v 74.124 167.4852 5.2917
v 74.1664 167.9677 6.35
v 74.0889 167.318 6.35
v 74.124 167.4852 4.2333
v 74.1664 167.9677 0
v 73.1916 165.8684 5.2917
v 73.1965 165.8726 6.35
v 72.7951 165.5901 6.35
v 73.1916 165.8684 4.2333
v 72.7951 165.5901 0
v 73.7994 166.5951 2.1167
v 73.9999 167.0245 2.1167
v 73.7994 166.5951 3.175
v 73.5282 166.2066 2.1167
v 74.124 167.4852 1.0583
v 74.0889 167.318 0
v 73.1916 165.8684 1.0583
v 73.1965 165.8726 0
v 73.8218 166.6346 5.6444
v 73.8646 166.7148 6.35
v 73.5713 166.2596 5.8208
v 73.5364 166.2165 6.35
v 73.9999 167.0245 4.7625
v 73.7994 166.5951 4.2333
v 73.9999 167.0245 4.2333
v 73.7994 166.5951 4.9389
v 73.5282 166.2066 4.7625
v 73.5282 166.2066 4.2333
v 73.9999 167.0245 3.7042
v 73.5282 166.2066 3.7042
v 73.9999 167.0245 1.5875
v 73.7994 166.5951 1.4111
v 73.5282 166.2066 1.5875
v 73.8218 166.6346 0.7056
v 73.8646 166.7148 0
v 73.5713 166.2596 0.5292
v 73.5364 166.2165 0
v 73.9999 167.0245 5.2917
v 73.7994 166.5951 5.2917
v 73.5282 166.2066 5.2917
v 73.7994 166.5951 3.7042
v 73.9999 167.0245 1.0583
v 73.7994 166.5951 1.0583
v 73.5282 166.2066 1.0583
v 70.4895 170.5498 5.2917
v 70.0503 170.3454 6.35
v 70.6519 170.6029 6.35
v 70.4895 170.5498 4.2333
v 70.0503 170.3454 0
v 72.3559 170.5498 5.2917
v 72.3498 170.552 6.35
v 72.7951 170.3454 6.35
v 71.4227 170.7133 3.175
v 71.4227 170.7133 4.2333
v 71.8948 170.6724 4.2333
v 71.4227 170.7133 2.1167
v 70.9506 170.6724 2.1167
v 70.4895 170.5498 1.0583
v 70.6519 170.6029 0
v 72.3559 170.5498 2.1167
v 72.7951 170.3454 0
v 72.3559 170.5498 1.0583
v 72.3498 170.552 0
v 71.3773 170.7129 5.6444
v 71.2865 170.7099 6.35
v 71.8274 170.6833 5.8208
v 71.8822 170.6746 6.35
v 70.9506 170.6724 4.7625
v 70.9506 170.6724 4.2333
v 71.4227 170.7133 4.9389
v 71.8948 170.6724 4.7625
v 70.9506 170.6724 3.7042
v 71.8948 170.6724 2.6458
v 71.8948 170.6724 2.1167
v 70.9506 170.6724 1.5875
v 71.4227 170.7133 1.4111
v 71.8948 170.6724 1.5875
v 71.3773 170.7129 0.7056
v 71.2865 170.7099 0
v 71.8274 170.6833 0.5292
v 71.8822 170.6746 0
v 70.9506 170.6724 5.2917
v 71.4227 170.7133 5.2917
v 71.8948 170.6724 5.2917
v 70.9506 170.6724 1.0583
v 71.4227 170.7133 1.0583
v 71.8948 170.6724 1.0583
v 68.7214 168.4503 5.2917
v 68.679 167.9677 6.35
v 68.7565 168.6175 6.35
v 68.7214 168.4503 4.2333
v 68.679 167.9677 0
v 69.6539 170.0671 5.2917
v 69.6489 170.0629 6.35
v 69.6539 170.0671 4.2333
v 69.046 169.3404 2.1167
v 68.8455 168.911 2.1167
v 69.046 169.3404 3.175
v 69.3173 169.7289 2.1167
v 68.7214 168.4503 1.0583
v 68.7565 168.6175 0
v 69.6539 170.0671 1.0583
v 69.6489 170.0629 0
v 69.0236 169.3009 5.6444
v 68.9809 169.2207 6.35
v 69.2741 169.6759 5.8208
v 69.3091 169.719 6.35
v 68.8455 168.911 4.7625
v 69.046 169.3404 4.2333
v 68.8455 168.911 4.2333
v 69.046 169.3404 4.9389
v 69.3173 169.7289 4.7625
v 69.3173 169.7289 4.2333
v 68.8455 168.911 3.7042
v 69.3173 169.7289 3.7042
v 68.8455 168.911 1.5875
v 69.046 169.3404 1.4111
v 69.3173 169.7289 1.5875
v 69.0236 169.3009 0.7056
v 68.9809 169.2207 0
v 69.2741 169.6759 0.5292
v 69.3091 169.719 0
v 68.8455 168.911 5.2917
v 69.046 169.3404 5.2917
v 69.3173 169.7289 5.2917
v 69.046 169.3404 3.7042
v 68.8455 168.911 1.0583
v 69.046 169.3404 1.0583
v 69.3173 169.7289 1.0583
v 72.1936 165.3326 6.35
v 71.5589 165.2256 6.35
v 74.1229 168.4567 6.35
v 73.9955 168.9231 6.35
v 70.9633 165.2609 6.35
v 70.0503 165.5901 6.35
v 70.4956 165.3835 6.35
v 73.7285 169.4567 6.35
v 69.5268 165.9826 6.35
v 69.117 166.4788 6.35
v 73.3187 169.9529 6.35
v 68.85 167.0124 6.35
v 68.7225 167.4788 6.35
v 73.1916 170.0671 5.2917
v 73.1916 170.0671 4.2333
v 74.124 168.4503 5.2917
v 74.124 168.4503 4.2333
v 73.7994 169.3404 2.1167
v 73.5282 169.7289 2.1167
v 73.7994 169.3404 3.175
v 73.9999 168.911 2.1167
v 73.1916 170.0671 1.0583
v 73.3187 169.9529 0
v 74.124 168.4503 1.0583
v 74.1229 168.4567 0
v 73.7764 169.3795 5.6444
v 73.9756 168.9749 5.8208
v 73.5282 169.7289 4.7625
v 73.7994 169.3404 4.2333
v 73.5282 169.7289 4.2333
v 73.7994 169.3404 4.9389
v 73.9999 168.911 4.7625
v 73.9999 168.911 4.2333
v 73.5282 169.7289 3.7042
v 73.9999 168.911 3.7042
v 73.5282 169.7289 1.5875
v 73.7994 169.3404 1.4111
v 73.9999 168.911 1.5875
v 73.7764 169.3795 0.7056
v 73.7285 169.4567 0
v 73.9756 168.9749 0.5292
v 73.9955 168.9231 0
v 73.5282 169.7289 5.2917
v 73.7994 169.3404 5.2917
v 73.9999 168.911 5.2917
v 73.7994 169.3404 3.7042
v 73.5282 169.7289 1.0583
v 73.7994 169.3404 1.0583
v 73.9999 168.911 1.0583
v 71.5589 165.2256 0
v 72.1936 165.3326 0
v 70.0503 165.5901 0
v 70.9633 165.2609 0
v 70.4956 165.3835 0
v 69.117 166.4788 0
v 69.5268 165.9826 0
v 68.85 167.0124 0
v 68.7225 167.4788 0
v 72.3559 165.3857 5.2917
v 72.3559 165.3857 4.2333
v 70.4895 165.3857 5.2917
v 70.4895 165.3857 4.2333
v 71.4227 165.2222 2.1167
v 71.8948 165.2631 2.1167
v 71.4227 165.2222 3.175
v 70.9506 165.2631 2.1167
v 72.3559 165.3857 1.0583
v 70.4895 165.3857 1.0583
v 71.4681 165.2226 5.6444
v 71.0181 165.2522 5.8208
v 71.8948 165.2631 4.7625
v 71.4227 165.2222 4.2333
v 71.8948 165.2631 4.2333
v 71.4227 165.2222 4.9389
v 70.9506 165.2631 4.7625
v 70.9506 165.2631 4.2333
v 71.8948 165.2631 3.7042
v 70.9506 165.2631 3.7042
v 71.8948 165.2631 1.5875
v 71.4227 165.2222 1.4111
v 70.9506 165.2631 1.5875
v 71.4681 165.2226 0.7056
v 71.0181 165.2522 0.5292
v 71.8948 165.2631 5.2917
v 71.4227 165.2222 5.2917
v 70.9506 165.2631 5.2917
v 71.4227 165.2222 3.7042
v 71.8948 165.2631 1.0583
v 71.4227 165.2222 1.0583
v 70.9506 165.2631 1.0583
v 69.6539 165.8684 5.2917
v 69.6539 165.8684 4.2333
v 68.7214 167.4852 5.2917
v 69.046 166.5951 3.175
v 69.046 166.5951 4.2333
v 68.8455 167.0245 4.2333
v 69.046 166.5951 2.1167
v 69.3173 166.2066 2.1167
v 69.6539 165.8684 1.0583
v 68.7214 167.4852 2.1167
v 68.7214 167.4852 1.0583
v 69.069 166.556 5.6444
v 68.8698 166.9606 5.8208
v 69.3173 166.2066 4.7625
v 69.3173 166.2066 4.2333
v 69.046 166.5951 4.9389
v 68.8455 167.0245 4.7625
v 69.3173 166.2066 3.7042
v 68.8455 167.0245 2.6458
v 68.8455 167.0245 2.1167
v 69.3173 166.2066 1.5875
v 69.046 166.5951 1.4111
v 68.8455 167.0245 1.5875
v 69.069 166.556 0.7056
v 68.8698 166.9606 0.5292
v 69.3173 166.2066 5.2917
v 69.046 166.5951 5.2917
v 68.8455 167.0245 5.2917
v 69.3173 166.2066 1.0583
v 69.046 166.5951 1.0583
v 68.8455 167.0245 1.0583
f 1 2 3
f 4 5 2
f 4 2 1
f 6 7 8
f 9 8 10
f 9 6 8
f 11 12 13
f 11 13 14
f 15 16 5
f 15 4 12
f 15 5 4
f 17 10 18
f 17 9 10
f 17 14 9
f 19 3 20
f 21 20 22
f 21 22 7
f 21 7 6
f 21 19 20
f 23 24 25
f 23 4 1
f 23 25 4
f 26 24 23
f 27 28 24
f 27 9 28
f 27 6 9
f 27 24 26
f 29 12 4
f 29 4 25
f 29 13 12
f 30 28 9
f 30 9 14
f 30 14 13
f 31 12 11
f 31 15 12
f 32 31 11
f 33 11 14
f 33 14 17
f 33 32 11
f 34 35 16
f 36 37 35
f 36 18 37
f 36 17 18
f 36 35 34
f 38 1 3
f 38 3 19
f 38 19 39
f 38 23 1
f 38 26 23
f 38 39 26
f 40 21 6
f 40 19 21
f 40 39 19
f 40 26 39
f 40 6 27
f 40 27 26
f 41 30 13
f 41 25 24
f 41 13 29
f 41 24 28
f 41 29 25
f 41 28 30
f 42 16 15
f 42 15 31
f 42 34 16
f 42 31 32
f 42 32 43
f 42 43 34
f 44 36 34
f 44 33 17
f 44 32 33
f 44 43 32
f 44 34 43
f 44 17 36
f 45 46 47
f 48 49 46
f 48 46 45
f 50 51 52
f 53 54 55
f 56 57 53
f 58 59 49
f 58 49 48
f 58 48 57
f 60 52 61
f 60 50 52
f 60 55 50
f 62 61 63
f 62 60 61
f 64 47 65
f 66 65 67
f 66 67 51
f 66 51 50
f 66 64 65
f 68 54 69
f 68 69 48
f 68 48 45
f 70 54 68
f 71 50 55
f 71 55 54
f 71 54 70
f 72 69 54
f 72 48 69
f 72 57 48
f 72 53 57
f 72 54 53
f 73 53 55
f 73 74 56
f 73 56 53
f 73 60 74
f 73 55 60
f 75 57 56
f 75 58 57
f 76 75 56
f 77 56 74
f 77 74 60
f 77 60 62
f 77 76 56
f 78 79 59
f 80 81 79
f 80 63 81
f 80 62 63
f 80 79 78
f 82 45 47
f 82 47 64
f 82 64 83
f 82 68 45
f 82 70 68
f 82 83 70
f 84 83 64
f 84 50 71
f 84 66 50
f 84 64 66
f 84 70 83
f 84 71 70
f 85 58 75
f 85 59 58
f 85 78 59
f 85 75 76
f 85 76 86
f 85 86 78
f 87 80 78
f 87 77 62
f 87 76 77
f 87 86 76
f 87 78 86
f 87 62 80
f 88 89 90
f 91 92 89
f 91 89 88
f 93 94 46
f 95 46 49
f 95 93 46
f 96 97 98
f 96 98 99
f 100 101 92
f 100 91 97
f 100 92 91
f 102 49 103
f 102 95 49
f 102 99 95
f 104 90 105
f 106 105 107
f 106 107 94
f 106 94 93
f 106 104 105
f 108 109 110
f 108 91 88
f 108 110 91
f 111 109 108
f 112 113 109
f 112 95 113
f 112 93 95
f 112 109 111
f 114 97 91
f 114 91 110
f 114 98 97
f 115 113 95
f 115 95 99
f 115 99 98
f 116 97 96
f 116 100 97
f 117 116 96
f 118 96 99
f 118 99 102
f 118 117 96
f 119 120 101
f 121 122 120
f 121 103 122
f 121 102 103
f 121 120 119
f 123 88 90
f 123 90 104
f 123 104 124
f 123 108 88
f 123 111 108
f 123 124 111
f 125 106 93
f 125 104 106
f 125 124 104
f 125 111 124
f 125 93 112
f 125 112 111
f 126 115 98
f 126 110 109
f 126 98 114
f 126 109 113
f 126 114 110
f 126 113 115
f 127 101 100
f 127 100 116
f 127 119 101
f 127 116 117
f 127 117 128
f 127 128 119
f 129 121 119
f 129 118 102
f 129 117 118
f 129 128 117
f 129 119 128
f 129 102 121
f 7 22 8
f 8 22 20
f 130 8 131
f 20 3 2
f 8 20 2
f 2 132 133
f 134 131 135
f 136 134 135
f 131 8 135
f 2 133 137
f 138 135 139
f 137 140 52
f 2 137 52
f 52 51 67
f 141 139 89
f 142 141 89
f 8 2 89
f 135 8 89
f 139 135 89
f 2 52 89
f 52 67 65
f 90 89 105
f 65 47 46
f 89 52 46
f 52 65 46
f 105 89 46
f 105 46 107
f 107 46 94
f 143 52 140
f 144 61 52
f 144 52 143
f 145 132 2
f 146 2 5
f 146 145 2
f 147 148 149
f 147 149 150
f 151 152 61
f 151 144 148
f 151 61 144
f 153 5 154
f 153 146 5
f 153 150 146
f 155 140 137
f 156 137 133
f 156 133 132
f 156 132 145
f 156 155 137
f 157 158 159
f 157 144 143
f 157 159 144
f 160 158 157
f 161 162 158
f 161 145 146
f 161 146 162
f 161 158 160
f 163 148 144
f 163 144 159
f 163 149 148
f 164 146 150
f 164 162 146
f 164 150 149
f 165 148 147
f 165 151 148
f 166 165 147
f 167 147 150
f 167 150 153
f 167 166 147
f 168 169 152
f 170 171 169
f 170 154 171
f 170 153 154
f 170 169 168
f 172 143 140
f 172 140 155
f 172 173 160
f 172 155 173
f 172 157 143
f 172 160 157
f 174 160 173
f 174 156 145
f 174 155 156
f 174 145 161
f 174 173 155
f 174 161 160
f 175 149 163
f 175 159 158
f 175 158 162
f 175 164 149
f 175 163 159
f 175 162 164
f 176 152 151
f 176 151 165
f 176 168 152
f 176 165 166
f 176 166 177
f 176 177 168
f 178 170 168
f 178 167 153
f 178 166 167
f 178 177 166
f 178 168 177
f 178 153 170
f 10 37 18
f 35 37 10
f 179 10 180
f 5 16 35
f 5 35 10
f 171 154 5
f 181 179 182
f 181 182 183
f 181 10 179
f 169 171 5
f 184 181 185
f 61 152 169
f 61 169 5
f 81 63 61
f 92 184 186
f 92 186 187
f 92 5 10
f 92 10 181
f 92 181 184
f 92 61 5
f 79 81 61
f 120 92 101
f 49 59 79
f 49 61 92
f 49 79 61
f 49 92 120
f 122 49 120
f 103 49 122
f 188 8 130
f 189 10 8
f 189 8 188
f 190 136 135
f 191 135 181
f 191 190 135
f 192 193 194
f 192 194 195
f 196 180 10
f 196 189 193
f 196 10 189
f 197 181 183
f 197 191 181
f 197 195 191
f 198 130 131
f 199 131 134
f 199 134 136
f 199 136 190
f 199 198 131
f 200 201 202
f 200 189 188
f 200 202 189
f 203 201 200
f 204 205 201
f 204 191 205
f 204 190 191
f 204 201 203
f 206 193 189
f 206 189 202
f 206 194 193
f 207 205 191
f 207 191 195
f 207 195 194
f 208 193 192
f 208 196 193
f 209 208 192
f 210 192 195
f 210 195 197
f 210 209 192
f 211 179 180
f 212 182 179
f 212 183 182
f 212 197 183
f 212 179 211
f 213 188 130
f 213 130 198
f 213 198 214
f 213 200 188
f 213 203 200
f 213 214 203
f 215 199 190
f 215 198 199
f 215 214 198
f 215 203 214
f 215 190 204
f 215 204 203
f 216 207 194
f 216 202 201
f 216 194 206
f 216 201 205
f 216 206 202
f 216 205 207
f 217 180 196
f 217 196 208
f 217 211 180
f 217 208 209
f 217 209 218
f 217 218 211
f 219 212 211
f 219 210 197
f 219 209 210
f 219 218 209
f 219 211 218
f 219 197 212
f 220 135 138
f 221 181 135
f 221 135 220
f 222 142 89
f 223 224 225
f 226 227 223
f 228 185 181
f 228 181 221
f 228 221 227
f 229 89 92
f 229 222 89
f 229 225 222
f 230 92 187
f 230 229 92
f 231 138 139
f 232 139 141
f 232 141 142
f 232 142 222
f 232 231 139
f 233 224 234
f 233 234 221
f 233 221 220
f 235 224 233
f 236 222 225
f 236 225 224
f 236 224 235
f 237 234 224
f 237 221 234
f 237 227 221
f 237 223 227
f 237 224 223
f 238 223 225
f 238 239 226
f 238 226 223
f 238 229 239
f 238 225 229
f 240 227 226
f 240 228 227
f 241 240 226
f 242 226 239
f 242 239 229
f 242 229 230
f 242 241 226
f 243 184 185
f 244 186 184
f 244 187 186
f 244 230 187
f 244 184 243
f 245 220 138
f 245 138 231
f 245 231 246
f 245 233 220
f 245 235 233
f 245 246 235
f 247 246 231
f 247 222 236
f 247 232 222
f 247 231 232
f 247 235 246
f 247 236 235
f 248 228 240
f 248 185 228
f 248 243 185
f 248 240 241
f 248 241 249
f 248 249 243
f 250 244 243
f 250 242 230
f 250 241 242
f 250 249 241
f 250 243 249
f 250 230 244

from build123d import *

# Parameters (mm, degrees)
BOSS_EXTRUDE7_DEPTH = 6.35


with BuildPart() as part:
    # planet pin → Boss-Extrude7 (new body)
    with BuildSketch(Plane.XY):
        with BuildLine():
            add(Edge.make_bspline(
                [(74.166418299, 167.967747425), (74.167078299, 166.987078425), (73.644276299, 166.080620425), (72.795101299, 165.590095425)],
                knots=[0, 0, 0, 0, 1, 1, 1, 1], degree=3))
            add(Edge.make_bspline(
                [(72.795101299, 165.590095425), (71.945927299, 165.099569425), (70.899510299, 165.099569425), (70.050335299, 165.590095425)],
                knots=[0, 0, 0, 0, 1, 1, 1, 1], degree=3))
            add(Edge.make_bspline(
                [(70.050335299, 165.590095425), (69.201161299, 166.080620425), (68.678359299, 166.987078425), (68.679019299, 167.967747425)],
                knots=[0, 0, 0, 0, 1, 1, 1, 1], degree=3))
            add(Edge.make_bspline(
                [(68.679019299, 167.967747425), (68.678359299, 168.948416425), (69.201161299, 169.854874425), (70.050335299, 170.345399425)],
                knots=[0, 0, 0, 0, 1, 1, 1, 1], degree=3))
            add(Edge.make_bspline(
                [(70.050335299, 170.345399425), (70.899510299, 170.835924425), (71.945927299, 170.835924425), (72.795101299, 170.345399425)],
                knots=[0, 0, 0, 0, 1, 1, 1, 1], degree=3))
            add(Edge.make_bspline(
                [(72.795101299, 170.345399425), (73.644276299, 169.854874425), (74.167078299, 168.948416425), (74.166418299, 167.967747425)],
                knots=[0, 0, 0, 0, 1, 1, 1, 1], degree=3))
        make_face()
    extrude(amount=BOSS_EXTRUDE7_DEPTH)


solid = part.part
